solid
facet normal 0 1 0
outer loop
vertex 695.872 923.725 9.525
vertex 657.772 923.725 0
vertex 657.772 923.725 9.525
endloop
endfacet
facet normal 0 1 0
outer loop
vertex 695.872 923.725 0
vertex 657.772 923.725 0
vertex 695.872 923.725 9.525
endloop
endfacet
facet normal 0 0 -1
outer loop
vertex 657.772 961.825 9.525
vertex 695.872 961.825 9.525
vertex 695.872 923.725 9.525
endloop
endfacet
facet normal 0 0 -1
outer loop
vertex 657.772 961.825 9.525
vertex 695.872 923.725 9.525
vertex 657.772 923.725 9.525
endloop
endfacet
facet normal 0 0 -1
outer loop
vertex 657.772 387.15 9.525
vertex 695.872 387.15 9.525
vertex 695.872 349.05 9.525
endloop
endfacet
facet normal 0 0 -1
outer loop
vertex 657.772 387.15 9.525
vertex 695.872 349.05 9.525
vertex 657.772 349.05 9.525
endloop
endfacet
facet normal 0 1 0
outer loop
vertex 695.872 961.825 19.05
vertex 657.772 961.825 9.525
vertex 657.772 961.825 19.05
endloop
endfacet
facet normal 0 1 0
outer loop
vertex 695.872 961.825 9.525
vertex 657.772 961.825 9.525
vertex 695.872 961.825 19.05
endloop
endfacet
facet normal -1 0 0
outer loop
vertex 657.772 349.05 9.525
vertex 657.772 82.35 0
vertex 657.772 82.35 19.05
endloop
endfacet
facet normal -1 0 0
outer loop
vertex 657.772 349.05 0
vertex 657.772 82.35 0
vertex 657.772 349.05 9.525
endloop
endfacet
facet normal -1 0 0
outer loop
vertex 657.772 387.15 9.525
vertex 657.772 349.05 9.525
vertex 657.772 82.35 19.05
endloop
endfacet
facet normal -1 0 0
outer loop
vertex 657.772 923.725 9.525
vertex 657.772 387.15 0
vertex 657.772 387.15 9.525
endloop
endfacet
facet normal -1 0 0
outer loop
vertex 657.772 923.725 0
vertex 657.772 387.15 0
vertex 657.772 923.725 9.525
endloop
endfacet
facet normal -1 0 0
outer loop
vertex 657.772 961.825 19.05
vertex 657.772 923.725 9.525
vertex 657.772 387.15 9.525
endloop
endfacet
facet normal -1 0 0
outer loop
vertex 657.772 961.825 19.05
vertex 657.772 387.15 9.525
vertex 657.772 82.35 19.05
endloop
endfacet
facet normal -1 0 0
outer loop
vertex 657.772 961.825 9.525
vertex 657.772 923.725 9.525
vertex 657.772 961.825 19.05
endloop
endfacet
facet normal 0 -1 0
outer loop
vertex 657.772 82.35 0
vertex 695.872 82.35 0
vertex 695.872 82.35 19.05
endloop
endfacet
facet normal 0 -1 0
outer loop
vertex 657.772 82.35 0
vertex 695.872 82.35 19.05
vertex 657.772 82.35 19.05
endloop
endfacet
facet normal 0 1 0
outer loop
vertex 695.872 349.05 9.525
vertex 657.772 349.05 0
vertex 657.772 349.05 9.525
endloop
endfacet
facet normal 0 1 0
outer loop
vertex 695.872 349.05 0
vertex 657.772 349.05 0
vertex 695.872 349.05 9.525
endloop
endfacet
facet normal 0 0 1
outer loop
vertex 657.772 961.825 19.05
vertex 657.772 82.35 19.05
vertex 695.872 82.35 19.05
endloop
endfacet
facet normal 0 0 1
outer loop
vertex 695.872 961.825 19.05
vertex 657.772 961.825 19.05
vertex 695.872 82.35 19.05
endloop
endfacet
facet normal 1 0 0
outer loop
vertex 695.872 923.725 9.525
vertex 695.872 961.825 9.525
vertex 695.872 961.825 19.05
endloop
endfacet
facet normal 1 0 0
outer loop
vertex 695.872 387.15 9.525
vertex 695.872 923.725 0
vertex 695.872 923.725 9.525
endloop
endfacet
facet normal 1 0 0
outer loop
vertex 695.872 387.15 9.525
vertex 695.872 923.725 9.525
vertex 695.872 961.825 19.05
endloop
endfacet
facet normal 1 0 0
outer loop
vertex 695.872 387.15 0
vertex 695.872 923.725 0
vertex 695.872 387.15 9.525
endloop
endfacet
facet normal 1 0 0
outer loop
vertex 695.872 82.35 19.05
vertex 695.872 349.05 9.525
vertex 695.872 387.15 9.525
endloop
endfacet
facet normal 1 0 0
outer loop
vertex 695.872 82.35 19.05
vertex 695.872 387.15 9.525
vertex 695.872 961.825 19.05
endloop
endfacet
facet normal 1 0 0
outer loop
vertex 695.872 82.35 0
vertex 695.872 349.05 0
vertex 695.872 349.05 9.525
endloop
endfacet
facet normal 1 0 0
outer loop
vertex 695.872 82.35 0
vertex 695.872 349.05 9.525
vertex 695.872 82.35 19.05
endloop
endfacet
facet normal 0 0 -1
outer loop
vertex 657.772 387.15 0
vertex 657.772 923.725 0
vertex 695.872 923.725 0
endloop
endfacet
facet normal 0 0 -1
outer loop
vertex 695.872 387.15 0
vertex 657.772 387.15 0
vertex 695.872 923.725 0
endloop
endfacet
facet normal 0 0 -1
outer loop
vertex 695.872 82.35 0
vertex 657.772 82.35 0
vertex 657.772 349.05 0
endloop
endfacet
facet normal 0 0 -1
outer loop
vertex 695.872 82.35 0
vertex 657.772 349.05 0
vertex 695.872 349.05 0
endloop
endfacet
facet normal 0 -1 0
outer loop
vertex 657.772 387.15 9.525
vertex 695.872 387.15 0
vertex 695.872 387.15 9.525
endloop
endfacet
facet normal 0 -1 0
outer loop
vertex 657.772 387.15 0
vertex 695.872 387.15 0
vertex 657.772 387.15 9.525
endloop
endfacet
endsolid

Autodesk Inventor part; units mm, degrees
ref_plane "YZ Plane" through (0, 0, 0) normal (1, 0, 0) x (0, 1, 0)
ref_plane "XZ Plane" through (0, 0, 0) normal (0, 1, 0) x (-1, 0, 0)
ref_plane "XY Plane" through (0, 0, 0) normal (0, 0, 1) x (1, 0, 0)
sketch "Sketch1" plane through (0, 0, 0) normal (0, 0, 1) x (1, 0, 0)
  line L0 (657.7721, 961.825) -> (695.8721, 961.825)
  line L1 (695.8721, 961.825) -> (695.8721, 82.35)
  line L2 (695.8721, 82.35) -> (657.7721, 82.35)
  line L3 (657.7721, 82.35) -> (657.7721, 961.825)
  point P0 (0, 0)
  dimension "d0" = 879.475
  dimension "d1" = 38.1
extrude "Board" add sketch "Sketch1" along normal blind 19.05
sketch "Sketch2" plane through (0, 0, 0) normal (0, 0, -1) x (-1, 0, 0)
  line L0 (-695.8721, 82.35) -> (-695.8721, 961.825) projected
  line L1 (-657.7721, 961.825) -> (-657.7721, 82.35) projected
  line L2 (-695.8721, 961.825) -> (-657.7721, 961.825)
  line L3 (-657.7721, 961.825) -> (-657.7721, 923.725)
  line L4 (-657.7721, 923.725) -> (-695.8721, 923.725)
  line L5 (-695.8721, 923.725) -> (-695.8721, 961.825)
  point P0 (0, 0)
  dimension "d4" = 38.1
extrude "Top Notch" cut sketch "Sketch2" against normal blind 9.525
sketch "Sketch3" plane through (0, 0, 0) normal (0, 0, -1) x (-1, 0, 0)
  line L0 (-695.8721, 923.725) -> (-695.8721, 82.35) projected
  line L1 (-657.7721, 961.825) -> (-657.7721, 82.35) projected
  line L2 (-695.8721, 387.15) -> (-657.7721, 387.15)
  line L3 (-657.7721, 387.15) -> (-657.7721, 349.05)
  line L4 (-657.7721, 349.05) -> (-695.8721, 349.05)
  line L5 (-695.8721, 349.05) -> (-695.8721, 387.15)
  line L6 (-695.8721, 82.35) -> (-657.7721, 82.35) projected
  line L7 (-695.8721, 961.825) -> (-657.7721, 961.825) projected
  point P0 (0, 0)
  dimension "d7" = 38.1
  dimension "d11" = 574.675
extrude "Bottom Notch" cut sketch "Sketch3" against normal blind 9.525 contours L2 L1 L4 L0
properties part number "Cabinet Support Frame Center Vertical Bar"
